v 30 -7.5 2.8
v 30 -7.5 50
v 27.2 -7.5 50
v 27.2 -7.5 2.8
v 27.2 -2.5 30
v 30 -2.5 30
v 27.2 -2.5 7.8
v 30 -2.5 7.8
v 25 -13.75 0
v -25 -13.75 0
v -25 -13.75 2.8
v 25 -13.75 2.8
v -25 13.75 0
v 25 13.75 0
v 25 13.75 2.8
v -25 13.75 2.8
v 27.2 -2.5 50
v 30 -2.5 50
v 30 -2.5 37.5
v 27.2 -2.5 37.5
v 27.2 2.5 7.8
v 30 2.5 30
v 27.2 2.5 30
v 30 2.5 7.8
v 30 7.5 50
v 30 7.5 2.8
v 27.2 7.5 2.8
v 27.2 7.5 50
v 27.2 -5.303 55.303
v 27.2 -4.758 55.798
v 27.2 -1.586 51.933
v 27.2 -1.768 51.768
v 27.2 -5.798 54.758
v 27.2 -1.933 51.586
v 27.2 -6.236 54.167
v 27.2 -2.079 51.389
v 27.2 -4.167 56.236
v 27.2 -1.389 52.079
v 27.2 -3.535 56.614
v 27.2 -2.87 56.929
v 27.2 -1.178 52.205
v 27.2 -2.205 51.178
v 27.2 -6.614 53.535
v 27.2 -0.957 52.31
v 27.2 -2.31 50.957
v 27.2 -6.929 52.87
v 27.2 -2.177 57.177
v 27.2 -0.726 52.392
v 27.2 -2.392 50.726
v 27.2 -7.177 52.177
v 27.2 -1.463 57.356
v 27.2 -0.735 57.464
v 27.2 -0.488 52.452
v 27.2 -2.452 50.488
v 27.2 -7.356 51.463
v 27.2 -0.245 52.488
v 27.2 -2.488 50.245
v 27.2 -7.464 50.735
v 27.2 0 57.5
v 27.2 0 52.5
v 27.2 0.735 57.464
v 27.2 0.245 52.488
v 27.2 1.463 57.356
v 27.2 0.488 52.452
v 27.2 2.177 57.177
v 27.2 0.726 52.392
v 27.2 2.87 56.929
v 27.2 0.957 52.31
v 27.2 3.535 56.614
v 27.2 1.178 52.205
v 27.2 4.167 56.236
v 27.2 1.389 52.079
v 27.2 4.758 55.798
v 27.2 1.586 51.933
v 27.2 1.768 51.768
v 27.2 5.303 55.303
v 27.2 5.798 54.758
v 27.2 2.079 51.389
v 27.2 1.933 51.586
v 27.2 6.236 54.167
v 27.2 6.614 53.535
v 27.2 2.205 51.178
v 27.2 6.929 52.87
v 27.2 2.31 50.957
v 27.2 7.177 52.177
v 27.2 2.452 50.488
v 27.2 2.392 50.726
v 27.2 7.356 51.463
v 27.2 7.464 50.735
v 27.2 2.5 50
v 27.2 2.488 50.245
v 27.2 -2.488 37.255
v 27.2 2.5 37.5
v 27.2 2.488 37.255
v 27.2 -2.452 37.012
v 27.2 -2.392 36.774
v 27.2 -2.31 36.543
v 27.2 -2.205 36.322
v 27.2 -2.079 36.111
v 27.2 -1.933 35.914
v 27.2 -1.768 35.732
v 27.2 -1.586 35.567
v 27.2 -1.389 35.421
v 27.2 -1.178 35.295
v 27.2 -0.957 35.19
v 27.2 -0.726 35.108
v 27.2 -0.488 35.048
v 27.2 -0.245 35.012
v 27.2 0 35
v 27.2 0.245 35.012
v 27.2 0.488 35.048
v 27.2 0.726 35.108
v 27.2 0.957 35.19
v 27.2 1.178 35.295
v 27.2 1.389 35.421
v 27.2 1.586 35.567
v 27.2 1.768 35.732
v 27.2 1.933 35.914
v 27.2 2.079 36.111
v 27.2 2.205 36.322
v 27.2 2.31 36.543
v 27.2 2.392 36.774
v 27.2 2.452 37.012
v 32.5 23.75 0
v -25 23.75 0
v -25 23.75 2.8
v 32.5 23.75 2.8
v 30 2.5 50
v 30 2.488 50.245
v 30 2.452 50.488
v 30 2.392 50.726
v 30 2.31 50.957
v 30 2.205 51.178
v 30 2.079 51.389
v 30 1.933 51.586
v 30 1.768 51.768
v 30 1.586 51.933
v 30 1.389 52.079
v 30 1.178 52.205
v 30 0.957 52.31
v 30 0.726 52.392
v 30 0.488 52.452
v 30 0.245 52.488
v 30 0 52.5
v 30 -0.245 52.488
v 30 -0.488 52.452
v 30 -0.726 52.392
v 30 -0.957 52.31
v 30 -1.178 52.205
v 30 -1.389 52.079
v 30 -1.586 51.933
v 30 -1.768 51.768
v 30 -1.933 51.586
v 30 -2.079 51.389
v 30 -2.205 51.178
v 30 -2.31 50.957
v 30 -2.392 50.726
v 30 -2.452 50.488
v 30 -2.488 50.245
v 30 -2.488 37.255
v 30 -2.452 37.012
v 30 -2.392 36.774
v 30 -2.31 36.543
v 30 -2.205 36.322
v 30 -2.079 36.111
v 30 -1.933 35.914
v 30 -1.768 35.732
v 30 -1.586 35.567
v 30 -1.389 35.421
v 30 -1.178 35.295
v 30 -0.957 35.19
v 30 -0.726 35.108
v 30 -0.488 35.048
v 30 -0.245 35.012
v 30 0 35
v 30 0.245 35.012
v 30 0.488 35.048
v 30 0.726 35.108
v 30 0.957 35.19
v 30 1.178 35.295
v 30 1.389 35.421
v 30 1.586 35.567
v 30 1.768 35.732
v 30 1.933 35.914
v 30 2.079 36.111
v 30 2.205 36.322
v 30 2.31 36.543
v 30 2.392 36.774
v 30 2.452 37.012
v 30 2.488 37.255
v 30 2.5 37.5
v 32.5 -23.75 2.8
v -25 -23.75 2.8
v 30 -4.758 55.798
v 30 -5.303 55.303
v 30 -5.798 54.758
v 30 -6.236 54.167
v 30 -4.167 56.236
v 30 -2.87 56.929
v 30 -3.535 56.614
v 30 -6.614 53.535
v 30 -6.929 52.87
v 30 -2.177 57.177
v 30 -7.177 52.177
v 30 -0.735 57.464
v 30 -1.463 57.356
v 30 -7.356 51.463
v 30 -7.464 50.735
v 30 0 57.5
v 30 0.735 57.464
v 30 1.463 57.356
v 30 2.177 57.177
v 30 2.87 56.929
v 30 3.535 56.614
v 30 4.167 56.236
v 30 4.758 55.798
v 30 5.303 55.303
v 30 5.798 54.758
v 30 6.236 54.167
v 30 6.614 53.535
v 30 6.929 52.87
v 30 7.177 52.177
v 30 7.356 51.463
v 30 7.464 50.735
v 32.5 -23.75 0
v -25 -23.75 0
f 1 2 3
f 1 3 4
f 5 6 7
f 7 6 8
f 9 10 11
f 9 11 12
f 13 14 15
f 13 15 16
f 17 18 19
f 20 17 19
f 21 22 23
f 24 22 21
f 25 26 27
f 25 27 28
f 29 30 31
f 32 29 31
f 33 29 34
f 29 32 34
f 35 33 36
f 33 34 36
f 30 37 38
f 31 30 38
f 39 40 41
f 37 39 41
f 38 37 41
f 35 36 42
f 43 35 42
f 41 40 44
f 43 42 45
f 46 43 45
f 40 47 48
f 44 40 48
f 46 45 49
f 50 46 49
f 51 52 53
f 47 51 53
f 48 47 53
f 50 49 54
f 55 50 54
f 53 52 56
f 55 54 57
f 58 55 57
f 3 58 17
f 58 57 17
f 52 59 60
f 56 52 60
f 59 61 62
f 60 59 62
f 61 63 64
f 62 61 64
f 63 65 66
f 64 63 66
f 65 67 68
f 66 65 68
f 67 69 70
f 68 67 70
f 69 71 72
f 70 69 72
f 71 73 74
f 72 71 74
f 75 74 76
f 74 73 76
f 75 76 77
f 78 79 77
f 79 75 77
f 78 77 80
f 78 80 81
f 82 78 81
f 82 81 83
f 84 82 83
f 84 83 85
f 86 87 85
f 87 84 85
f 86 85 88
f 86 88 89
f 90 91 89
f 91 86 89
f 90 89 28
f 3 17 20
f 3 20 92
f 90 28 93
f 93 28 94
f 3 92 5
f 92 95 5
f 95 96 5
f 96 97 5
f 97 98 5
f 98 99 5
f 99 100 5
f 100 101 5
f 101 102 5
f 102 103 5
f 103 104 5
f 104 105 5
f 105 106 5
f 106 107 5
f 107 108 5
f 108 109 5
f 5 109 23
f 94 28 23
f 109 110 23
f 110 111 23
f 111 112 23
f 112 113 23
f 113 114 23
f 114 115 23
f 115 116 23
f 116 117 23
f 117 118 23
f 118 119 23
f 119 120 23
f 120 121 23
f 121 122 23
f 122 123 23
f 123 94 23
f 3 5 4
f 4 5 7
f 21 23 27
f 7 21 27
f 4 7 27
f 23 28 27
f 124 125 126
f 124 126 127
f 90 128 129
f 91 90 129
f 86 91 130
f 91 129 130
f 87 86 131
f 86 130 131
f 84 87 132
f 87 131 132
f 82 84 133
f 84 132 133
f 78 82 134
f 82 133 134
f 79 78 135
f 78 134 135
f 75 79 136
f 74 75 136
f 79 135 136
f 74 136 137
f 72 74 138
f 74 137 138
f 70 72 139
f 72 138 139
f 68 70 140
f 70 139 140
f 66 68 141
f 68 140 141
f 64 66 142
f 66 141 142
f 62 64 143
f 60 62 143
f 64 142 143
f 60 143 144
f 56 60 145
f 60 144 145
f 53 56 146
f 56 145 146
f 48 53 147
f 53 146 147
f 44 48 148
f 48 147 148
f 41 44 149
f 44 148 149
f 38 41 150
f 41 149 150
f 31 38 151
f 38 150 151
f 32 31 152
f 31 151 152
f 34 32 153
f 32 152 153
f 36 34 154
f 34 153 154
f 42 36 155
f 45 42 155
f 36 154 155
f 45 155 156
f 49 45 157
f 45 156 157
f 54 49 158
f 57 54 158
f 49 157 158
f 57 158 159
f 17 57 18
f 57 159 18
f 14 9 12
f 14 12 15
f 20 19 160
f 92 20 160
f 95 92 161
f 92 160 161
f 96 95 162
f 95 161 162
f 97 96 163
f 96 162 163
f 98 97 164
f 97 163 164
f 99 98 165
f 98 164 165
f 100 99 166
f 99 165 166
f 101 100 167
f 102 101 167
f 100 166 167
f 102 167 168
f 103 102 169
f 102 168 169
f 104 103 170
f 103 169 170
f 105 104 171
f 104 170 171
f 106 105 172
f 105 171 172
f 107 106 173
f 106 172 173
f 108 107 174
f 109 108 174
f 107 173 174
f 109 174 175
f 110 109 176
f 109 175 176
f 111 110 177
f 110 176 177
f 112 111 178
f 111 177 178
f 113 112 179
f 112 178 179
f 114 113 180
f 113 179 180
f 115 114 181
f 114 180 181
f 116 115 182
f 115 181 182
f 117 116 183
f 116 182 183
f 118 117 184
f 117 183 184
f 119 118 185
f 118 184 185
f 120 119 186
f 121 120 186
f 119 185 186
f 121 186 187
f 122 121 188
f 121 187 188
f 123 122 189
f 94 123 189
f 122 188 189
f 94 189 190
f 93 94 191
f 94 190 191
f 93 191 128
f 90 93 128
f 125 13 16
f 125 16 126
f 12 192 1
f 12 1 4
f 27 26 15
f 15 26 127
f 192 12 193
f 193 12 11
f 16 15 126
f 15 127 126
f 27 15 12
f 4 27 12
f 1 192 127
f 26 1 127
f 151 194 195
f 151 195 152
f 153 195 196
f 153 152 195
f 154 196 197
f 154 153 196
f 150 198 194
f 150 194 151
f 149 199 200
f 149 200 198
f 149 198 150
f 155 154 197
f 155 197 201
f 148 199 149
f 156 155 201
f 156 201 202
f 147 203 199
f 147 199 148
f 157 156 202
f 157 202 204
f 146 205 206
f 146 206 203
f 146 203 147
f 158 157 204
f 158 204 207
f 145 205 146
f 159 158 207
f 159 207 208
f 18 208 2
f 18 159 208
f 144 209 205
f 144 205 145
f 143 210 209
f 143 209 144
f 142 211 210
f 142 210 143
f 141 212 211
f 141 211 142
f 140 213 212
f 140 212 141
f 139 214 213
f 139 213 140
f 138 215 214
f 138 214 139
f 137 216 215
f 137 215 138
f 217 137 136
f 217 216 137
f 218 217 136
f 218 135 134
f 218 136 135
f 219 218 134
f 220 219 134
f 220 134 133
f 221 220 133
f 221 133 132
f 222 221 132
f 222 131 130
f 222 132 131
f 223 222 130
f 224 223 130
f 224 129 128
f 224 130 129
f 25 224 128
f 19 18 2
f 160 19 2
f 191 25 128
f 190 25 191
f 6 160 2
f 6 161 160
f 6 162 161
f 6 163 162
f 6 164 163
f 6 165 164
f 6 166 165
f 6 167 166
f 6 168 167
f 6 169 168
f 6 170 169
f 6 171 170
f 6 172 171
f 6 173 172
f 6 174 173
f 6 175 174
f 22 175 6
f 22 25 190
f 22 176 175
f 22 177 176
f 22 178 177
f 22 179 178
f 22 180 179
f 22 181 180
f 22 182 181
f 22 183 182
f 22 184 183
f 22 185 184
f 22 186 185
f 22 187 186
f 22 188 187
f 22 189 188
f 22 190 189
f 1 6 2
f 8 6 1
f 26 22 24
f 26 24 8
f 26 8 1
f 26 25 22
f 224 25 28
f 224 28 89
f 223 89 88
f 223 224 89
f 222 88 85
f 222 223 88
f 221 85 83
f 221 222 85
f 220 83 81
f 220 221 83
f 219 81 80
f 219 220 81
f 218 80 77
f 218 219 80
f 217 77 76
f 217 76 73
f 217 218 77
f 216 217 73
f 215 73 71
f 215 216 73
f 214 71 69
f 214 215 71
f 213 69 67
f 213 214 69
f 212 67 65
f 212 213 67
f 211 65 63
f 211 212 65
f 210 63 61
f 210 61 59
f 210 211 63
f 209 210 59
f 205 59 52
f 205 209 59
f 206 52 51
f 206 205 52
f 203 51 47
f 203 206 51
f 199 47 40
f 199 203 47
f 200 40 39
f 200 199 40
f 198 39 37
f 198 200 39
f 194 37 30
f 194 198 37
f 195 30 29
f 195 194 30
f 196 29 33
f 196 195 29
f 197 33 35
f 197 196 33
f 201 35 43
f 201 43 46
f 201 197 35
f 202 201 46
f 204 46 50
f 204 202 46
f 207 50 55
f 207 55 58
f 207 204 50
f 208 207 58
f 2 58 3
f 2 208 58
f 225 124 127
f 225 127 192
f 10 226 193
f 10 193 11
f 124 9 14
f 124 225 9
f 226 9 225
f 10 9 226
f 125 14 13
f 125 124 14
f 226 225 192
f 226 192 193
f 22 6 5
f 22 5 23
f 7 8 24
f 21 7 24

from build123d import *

# Parameters (mm, degrees)
BOSS_EXTRUDE1_DEPTH = 2.8
SKETCH2_W           = 22.2
SKETCH2_H           = 5
BOSS_EXTRUDE2_DEPTH = 2.8


with BuildPart() as part:
    # Sketch1 → Boss-Extrude1 (new body)
    with BuildSketch(Plane.XY):
        Polygon((-25, -13.75), (25, -13.75), (25, 13.75), (-25, 13.75), (-25, 23.75), (32.5, 23.75), (32.5, -23.75), (-25, -23.75), align=None)
    extrude(amount=BOSS_EXTRUDE1_DEPTH)

    # Sketch2 → Boss-Extrude2 (add)
    with BuildSketch(Plane(origin=(30, 0, 0), x_dir=(0, 0, -1), z_dir=(1, 0, 0))):
        with BuildLine():
            Line((-2.8, -7.5), (-2.8, 7.5))
            Line((-2.8, 7.5), (-50, 7.5))
            ThreePointArc((-50, 7.5), (-57.5, 0), (-50, -7.5))
            Line((-50, -7.5), (-2.8, -7.5))
        make_face()
        with BuildLine():
            Line((-50, -2.5), (-37.5, -2.5))
            ThreePointArc((-37.5, -2.5), (-35, 0), (-37.5, 2.5))
            Line((-37.5, 2.5), (-50, 2.5))
            ThreePointArc((-50, 2.5), (-52.5, 0), (-50, -2.5))
        make_face(mode=Mode.SUBTRACT)
        with Locations((-18.9, 0)):
            Rectangle(SKETCH2_W, SKETCH2_H, mode=Mode.SUBTRACT)
    extrude(amount=-BOSS_EXTRUDE2_DEPTH)


solid = part.part
